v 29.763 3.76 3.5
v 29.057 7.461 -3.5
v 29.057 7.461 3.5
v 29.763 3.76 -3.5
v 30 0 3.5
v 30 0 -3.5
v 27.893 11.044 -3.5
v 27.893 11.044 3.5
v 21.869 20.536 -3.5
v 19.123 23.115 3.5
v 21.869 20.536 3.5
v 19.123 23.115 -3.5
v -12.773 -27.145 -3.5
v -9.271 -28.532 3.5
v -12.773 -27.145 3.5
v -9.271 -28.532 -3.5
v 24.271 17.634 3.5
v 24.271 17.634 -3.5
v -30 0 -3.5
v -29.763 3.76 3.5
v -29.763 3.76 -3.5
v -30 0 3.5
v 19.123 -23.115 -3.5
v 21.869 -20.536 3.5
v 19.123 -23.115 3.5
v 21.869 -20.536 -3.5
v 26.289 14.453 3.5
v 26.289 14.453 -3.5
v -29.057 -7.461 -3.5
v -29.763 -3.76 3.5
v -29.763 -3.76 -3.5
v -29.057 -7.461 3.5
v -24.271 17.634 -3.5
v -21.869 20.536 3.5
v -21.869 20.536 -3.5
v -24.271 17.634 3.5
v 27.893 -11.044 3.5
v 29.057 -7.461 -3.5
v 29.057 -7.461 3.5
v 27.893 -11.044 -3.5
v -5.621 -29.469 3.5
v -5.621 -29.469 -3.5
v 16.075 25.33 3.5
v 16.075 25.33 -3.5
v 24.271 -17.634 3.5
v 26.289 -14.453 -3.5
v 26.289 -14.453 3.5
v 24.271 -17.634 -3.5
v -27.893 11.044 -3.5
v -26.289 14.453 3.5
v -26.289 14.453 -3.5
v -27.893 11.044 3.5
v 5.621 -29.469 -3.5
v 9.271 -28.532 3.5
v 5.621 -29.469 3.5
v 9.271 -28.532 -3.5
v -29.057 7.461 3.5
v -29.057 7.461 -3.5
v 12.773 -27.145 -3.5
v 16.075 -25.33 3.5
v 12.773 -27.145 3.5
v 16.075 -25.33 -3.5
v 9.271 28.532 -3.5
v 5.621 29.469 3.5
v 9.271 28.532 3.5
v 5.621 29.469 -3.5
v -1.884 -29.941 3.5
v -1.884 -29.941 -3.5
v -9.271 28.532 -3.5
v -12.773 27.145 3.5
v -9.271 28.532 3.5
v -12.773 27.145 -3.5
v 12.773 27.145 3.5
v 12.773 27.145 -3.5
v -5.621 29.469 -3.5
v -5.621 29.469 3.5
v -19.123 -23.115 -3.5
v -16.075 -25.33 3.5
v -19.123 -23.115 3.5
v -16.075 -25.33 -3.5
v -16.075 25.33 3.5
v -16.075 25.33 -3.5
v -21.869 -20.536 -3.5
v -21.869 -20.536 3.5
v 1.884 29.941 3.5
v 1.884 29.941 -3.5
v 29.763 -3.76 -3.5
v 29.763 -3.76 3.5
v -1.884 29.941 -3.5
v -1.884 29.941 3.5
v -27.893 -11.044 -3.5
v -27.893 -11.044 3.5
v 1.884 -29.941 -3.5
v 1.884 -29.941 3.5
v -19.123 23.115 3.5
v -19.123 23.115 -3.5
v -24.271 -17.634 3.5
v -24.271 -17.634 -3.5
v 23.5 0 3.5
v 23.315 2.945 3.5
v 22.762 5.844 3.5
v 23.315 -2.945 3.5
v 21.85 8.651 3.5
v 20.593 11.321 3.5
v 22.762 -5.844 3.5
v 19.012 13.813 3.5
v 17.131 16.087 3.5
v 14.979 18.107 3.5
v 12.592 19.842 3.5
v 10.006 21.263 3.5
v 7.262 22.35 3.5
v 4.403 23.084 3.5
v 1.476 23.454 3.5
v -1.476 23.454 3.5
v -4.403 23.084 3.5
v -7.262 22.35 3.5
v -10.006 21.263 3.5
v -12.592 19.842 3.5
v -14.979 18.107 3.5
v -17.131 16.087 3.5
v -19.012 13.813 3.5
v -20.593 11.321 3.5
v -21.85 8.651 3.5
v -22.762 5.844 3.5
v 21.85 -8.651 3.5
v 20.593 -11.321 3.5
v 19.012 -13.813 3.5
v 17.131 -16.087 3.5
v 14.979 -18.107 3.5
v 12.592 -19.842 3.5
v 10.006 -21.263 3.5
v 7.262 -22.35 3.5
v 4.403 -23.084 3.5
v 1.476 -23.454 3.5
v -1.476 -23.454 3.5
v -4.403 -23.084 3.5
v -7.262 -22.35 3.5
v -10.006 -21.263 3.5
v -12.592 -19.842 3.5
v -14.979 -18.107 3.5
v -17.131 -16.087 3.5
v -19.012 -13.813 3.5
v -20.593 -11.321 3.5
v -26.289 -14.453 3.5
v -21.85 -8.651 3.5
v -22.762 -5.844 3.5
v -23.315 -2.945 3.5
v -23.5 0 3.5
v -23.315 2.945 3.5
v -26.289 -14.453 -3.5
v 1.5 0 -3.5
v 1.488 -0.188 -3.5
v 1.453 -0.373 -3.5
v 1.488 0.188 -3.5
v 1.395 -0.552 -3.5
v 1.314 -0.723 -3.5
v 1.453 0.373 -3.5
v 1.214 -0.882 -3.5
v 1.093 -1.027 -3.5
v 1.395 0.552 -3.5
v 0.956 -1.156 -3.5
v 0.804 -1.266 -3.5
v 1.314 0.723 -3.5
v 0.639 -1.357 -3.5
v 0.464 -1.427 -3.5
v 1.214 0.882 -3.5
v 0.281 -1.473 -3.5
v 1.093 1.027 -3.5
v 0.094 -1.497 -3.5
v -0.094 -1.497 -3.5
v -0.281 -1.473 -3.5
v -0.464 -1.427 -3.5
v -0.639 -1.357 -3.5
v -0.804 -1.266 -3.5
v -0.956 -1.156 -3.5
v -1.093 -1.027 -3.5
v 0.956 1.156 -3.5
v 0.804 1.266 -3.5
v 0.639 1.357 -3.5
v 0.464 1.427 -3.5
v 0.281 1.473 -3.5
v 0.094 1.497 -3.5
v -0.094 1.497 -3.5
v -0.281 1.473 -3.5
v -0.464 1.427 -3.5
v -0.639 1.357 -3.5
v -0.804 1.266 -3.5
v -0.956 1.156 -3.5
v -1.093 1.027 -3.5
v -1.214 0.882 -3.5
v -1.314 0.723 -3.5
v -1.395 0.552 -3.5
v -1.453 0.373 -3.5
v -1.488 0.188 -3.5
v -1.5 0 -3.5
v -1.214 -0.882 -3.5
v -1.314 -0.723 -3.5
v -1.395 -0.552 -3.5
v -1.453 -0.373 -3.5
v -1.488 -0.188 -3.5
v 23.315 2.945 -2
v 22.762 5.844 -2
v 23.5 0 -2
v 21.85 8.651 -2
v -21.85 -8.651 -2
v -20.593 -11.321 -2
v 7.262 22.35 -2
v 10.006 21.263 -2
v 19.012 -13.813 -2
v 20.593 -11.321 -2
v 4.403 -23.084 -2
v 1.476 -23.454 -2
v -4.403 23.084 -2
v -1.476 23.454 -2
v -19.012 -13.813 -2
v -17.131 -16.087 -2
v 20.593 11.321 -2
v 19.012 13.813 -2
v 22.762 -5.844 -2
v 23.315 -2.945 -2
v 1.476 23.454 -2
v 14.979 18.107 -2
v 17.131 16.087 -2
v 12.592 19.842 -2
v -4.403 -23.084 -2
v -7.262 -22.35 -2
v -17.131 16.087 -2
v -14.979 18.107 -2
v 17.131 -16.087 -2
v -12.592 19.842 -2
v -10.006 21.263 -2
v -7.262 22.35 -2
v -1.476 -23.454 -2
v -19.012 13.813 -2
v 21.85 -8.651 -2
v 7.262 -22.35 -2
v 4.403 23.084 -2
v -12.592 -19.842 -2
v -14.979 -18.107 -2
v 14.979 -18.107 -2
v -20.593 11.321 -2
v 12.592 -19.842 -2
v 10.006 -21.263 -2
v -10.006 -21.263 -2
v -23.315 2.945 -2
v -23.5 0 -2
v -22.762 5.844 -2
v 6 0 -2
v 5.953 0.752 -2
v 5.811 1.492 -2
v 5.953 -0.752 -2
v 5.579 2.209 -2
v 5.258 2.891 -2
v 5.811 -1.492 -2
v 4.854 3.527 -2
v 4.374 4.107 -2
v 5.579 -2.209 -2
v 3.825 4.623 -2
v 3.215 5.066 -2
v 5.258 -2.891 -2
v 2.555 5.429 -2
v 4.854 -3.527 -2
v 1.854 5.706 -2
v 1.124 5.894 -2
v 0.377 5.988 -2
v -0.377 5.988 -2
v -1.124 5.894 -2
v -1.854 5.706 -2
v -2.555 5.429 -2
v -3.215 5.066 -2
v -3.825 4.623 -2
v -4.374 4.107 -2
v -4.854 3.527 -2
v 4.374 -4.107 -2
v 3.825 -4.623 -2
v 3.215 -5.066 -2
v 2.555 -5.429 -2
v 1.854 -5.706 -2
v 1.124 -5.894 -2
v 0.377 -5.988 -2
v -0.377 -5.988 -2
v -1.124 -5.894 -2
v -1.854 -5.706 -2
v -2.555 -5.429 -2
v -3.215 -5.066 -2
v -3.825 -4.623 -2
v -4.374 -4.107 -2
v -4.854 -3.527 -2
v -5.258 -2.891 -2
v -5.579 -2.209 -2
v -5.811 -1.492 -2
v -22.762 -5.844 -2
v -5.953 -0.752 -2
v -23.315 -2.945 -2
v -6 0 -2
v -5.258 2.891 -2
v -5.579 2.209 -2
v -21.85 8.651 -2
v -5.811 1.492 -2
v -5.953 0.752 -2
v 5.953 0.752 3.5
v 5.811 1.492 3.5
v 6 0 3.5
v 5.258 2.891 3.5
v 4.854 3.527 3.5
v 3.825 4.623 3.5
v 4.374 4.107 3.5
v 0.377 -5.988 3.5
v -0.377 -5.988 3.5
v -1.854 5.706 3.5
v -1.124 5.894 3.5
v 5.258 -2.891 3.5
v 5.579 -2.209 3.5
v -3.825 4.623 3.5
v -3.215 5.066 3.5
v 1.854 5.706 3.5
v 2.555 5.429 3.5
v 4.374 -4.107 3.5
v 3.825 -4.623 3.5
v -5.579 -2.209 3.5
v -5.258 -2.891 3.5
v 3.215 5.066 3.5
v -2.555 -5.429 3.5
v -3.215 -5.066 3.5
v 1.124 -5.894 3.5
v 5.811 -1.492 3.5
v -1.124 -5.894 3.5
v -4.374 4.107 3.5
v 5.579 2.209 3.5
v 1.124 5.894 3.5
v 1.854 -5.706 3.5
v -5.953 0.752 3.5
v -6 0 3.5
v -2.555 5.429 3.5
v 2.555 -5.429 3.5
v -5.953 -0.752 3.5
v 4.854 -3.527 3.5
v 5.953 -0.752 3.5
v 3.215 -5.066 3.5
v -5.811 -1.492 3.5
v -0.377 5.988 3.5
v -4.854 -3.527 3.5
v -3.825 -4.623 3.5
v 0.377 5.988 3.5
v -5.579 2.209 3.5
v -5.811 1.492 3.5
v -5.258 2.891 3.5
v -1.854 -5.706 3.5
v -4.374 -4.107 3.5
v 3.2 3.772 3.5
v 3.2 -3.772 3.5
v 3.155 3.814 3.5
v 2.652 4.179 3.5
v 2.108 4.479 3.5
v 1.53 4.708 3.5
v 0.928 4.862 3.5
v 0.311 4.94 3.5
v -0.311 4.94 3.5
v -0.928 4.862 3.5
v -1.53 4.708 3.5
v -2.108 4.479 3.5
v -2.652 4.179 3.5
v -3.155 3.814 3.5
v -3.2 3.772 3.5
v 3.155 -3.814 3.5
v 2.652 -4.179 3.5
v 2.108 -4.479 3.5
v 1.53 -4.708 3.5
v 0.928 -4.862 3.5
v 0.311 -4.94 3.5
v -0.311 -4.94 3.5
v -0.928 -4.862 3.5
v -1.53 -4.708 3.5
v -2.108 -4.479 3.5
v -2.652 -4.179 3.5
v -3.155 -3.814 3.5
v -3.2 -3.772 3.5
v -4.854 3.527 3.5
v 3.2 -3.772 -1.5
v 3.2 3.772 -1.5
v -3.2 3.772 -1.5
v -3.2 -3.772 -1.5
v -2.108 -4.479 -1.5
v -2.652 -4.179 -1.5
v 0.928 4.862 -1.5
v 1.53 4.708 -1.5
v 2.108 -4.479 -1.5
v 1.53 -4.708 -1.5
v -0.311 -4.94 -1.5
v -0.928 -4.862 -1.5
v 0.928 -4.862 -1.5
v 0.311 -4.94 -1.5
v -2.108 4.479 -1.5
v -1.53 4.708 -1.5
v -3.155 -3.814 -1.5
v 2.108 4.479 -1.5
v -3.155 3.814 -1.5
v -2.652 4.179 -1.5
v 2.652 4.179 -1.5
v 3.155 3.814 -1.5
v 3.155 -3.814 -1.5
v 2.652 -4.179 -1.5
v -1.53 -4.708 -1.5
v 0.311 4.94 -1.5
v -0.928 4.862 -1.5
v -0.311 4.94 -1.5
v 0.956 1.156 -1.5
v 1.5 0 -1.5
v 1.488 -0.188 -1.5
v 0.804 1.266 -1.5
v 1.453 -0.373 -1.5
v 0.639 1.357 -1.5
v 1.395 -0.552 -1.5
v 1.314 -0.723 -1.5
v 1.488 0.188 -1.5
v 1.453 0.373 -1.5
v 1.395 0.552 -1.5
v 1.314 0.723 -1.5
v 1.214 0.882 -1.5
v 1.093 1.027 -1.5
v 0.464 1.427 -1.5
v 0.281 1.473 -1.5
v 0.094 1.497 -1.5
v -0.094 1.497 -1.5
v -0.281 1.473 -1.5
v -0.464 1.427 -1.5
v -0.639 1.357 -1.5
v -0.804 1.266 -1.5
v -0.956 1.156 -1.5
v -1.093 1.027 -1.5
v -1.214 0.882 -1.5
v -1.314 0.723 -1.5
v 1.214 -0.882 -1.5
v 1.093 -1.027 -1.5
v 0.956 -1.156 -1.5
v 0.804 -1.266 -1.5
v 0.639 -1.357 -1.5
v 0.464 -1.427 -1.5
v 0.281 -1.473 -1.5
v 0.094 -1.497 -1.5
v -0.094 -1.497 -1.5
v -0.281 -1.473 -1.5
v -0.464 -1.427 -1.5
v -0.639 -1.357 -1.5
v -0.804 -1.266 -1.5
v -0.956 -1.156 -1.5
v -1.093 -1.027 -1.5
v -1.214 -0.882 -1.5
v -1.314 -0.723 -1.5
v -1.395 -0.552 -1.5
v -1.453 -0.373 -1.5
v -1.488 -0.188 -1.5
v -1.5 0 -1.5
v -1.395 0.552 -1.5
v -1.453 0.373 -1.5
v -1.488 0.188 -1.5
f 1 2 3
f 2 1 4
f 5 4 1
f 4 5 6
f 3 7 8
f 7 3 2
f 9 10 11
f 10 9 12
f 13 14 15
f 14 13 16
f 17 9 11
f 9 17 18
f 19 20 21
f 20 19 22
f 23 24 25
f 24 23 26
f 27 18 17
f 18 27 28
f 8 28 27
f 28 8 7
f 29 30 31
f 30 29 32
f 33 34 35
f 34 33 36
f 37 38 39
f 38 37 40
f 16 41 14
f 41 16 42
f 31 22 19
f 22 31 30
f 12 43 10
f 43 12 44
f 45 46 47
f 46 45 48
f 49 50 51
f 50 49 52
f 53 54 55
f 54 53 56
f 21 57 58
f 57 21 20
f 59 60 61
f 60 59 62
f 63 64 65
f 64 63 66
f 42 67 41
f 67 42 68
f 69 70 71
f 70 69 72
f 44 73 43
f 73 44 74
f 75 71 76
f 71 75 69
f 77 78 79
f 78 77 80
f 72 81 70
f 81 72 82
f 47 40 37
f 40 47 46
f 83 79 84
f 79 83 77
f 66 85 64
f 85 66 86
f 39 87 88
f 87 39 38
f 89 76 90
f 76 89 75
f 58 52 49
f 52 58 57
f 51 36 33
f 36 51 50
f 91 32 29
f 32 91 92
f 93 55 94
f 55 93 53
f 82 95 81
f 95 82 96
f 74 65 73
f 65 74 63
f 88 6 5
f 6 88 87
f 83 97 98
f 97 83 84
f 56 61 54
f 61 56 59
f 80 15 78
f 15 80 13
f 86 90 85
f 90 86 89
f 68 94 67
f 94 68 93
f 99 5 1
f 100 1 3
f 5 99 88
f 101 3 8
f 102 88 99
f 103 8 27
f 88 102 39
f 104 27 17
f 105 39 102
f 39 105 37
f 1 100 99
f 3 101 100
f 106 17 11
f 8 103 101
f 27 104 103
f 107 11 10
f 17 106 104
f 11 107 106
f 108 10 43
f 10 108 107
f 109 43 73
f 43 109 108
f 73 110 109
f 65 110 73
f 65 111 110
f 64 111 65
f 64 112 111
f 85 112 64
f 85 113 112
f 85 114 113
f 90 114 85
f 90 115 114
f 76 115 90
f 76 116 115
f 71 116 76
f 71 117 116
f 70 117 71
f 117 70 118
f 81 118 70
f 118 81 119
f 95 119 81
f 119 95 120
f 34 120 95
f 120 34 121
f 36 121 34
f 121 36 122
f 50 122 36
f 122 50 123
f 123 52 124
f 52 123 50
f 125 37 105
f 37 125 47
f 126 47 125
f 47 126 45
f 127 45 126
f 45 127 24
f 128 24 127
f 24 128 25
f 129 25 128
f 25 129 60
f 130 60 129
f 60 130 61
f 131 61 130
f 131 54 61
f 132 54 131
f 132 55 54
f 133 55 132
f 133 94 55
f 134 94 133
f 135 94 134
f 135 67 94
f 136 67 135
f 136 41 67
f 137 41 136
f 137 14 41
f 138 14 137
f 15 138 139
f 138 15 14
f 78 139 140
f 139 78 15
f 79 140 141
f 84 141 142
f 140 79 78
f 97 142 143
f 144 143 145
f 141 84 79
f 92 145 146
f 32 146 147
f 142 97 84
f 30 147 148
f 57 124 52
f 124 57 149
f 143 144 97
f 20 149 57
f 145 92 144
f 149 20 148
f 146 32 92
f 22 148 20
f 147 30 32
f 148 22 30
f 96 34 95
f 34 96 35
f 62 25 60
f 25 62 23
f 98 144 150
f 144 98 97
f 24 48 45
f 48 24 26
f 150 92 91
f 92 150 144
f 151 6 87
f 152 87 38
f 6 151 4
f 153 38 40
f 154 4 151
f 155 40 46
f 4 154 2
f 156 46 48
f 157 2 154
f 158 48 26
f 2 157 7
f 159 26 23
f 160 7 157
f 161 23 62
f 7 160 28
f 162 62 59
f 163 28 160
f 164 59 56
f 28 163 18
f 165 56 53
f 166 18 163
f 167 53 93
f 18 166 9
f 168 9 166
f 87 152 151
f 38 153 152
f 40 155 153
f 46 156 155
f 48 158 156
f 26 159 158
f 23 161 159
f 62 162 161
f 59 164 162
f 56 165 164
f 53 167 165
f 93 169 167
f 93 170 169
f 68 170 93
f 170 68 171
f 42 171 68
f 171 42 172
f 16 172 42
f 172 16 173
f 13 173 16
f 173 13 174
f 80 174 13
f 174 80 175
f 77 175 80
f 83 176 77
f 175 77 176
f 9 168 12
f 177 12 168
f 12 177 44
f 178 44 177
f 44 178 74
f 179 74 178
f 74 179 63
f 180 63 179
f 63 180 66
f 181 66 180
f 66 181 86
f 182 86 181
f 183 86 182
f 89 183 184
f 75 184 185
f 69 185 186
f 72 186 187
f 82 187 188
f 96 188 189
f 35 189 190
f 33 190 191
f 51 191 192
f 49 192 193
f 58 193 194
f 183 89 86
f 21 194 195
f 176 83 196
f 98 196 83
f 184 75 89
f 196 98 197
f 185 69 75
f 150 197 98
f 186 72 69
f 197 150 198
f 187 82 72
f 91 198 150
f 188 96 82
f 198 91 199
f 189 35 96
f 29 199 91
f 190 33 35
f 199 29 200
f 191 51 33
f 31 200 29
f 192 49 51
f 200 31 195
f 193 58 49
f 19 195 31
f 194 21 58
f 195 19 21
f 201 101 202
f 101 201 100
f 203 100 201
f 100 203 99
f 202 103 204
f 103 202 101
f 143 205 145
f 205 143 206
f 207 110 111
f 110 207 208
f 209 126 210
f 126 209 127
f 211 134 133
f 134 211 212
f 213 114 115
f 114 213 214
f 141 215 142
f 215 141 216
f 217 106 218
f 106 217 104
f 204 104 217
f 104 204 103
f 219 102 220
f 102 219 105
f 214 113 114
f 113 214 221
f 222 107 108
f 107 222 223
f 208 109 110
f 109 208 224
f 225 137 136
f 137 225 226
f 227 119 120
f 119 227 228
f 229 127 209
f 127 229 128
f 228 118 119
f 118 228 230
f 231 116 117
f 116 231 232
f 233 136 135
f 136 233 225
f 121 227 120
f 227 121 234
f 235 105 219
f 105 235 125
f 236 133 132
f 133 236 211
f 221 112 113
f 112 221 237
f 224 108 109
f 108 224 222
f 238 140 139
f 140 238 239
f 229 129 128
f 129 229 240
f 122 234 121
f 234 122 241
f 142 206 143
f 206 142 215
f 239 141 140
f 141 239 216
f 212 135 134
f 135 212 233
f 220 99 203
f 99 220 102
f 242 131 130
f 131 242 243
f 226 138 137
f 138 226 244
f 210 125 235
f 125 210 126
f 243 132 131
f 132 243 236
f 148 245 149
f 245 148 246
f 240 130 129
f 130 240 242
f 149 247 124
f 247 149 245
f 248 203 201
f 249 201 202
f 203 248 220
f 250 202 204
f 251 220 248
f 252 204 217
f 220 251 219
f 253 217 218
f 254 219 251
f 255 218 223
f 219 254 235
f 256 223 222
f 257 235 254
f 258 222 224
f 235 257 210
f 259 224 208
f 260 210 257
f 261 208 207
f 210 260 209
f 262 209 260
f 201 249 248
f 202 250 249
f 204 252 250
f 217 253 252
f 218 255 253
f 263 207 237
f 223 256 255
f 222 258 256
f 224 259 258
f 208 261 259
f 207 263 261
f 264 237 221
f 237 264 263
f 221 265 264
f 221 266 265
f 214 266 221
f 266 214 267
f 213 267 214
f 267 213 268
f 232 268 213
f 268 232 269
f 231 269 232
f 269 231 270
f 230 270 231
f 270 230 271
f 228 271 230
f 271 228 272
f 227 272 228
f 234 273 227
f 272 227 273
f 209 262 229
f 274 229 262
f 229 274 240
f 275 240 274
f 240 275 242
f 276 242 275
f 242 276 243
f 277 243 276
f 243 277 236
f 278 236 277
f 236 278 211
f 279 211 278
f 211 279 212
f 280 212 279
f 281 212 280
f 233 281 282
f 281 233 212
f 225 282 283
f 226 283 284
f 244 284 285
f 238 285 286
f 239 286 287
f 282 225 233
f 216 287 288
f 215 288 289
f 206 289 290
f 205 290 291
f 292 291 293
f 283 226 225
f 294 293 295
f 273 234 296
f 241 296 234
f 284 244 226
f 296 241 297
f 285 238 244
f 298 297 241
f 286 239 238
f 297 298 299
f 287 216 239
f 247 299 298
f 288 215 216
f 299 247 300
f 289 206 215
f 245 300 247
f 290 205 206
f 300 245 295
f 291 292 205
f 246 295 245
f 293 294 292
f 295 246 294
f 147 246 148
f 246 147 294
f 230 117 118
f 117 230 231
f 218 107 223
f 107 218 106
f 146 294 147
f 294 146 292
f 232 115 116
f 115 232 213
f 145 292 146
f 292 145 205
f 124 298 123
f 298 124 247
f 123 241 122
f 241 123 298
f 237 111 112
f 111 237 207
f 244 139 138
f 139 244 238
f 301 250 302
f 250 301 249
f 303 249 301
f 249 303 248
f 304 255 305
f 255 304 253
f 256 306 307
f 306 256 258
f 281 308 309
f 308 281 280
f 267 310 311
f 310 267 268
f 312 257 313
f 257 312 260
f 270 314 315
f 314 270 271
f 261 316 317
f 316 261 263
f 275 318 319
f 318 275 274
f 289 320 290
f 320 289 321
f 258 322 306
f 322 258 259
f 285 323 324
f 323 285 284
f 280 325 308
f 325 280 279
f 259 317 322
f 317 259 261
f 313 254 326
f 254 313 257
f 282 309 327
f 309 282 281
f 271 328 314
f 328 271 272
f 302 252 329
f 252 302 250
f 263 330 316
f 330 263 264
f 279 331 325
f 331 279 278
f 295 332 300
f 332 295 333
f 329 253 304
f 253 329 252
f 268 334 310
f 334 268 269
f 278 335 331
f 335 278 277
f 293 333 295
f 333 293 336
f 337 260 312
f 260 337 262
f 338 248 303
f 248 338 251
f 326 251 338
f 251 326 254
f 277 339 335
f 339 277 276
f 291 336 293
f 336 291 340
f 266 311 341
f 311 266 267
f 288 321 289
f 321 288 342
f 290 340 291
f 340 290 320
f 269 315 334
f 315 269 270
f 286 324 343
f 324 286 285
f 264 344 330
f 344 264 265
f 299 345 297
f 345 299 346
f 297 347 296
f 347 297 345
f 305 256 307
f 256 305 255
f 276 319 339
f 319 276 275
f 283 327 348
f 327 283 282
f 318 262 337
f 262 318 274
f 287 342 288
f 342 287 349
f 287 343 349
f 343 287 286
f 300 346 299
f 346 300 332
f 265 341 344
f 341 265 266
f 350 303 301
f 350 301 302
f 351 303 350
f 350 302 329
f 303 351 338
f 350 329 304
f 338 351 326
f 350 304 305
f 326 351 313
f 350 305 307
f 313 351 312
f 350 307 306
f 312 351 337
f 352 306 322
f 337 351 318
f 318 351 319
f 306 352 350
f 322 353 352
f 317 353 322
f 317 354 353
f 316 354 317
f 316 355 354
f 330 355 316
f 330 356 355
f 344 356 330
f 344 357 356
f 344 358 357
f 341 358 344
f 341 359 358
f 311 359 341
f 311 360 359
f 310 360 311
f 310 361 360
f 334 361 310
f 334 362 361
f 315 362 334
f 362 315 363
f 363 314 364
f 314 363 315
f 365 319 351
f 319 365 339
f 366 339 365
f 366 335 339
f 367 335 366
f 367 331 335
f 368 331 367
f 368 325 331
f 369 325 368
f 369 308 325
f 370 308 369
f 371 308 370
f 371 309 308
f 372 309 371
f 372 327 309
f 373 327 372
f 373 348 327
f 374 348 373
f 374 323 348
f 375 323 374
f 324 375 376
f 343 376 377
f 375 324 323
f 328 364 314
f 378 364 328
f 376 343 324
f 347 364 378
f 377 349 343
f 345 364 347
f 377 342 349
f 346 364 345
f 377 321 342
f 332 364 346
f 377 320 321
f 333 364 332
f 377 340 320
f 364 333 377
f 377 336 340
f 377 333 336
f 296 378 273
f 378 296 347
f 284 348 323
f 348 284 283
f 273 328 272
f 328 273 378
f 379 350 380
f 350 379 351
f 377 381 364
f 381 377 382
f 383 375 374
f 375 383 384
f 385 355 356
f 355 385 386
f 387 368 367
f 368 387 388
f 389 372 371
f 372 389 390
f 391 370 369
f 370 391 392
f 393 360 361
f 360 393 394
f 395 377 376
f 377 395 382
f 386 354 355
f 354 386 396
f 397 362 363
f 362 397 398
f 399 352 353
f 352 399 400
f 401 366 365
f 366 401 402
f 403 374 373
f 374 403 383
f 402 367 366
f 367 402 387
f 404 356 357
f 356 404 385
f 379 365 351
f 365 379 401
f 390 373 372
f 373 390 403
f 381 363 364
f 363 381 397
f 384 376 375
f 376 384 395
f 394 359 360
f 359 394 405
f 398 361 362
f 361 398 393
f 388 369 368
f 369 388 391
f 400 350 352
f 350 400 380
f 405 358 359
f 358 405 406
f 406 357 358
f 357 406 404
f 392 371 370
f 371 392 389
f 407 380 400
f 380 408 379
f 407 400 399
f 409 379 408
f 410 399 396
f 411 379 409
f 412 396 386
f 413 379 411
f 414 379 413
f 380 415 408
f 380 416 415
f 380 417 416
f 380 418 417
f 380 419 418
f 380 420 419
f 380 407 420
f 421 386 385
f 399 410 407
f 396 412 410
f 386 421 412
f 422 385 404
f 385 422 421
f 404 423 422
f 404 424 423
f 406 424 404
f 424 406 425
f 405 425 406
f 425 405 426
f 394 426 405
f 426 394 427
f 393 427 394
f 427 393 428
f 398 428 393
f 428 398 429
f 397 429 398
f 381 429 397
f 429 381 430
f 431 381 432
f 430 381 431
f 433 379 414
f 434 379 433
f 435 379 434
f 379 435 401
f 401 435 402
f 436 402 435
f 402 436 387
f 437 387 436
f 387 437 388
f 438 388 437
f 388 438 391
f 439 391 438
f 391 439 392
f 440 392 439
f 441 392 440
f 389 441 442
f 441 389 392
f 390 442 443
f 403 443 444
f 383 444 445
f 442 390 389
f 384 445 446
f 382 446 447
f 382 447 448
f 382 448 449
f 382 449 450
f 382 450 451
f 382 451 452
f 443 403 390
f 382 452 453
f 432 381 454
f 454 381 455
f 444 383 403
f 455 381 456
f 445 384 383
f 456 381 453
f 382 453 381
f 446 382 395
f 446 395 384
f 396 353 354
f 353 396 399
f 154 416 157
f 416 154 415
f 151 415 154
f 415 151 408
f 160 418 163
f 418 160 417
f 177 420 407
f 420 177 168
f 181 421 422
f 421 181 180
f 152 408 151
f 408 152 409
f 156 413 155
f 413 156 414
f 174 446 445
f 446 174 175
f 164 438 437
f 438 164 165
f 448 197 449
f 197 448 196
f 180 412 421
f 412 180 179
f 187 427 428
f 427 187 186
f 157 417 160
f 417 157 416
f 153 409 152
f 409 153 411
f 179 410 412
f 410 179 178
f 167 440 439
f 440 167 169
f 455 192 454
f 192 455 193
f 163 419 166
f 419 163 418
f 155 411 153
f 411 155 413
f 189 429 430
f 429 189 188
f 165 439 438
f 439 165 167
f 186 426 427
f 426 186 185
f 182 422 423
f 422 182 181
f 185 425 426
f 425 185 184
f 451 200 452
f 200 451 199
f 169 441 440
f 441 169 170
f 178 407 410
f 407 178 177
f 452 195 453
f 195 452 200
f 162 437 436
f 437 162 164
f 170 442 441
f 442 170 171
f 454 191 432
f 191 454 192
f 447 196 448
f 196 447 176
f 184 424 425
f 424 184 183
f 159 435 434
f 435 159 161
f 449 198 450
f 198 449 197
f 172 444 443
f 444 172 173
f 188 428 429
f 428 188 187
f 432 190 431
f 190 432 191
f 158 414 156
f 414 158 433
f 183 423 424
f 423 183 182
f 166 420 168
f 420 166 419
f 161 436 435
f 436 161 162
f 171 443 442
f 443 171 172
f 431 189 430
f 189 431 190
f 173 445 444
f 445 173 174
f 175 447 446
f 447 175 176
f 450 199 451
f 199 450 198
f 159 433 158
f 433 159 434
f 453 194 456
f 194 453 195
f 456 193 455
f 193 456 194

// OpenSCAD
// file: Shaft.scad
include <Dimensions.scad>
$fn=50;

shaft(0);

module shaft(delta=0){
    cutNotch(delta)
    {
        cylinder(h=shaftLength,d=shaftDiameter+delta*2,center=true);
    }
}

module cutNotch(delta=0){
    notchHeight=3;
    difference()
    {
        children();

        translate([0,0,shaftDiameter/2+shaftLength/2-(capRingHeight-1)+delta])
        union(){
            translate([shaftDiameter/2+notchHeight+delta,0,0])
            cube([shaftDiameter,shaftDiameter,shaftDiameter],center=true);

            translate([-shaftDiameter/2-notchHeight-delta,0,0])
            cube([shaftDiameter,shaftDiameter,shaftDiameter],center=true);
        }
    }
}
// file: ClickRingBase.scad
$fn=50;
overlap=0.006;

clickringHeight=4.5;
clickringDiameter=40;
clickringThickness=2;

notchDiameter=50;
notchHeight=0.7;

deltaRinsize=2;

module ring(height=clickringHeight,delta=0){
    difference()
    {
        cylinder(h=height+delta-deltaRinsize,d=clickringDiameter+delta,center=true);
        cylinder(h=height+1-delta-deltaRinsize,d=clickringDiameter-clickringThickness*2-delta,center=true);
    }
}
// file: Dimensions.scad
overlap=0.006;
$fn=50;

basePlateThickness=1;

ringOuterDiameter=60;
ringInnerDiameter=47;
ringHeight=10;
baseRingHeight=7;
capRingHeight=baseRingHeight;

axeDiameter=10;

screwHoleInnerDiameter=2.5;
screwHoleOuterDiameter=3.0;
screwHoleLength=14;
screwHoleStrengthener=0.5;

shaftLength=ringHeight*6+baseRingHeight+capRingHeight-screwHoleStrengthener-basePlateThickness*2;
shaftDiameter=9.5;
// main file
include <Dimensions.scad>
include <ClickRingBase.scad>
use <Shaft.scad>
//use <..\tools\DevTools.scad>

overlap=0.006;
$fn=50;

createCapModel();

module createCapModel(){
    addScrewHole(){
        difference()
        {
            union(){
                basePlateAndRing();
                cylinder(h=capRingHeight,d=axeDiameter+2,center=true);
            }

            translate([0,0,shaftLength/2-capRingHeight/2+basePlateThickness+basePlateThickness])
            rotate([180,0,0])
            shaft(0.2);
        }
    }
}

module basePlateAndRing(){
    difference()
    {
        cylinder(h=capRingHeight,d=ringOuterDiameter,center=true);
        translate([0,0,basePlateThickness])
        cylinder(h=capRingHeight-1,d=ringInnerDiameter,center=true);
    }
}

module addScrewHole(){
    difference()
    {
        union(){
            children();
            translate([0,0,screwHoleStrengthener/2-capRingHeight/2+basePlateThickness])
            cylinder(h=screwHoleStrengthener,d=axeDiameter,center=true);
        }
        cylinder(h=screwHoleLength+10,d=screwHoleOuterDiameter,center=true);
    }
}
